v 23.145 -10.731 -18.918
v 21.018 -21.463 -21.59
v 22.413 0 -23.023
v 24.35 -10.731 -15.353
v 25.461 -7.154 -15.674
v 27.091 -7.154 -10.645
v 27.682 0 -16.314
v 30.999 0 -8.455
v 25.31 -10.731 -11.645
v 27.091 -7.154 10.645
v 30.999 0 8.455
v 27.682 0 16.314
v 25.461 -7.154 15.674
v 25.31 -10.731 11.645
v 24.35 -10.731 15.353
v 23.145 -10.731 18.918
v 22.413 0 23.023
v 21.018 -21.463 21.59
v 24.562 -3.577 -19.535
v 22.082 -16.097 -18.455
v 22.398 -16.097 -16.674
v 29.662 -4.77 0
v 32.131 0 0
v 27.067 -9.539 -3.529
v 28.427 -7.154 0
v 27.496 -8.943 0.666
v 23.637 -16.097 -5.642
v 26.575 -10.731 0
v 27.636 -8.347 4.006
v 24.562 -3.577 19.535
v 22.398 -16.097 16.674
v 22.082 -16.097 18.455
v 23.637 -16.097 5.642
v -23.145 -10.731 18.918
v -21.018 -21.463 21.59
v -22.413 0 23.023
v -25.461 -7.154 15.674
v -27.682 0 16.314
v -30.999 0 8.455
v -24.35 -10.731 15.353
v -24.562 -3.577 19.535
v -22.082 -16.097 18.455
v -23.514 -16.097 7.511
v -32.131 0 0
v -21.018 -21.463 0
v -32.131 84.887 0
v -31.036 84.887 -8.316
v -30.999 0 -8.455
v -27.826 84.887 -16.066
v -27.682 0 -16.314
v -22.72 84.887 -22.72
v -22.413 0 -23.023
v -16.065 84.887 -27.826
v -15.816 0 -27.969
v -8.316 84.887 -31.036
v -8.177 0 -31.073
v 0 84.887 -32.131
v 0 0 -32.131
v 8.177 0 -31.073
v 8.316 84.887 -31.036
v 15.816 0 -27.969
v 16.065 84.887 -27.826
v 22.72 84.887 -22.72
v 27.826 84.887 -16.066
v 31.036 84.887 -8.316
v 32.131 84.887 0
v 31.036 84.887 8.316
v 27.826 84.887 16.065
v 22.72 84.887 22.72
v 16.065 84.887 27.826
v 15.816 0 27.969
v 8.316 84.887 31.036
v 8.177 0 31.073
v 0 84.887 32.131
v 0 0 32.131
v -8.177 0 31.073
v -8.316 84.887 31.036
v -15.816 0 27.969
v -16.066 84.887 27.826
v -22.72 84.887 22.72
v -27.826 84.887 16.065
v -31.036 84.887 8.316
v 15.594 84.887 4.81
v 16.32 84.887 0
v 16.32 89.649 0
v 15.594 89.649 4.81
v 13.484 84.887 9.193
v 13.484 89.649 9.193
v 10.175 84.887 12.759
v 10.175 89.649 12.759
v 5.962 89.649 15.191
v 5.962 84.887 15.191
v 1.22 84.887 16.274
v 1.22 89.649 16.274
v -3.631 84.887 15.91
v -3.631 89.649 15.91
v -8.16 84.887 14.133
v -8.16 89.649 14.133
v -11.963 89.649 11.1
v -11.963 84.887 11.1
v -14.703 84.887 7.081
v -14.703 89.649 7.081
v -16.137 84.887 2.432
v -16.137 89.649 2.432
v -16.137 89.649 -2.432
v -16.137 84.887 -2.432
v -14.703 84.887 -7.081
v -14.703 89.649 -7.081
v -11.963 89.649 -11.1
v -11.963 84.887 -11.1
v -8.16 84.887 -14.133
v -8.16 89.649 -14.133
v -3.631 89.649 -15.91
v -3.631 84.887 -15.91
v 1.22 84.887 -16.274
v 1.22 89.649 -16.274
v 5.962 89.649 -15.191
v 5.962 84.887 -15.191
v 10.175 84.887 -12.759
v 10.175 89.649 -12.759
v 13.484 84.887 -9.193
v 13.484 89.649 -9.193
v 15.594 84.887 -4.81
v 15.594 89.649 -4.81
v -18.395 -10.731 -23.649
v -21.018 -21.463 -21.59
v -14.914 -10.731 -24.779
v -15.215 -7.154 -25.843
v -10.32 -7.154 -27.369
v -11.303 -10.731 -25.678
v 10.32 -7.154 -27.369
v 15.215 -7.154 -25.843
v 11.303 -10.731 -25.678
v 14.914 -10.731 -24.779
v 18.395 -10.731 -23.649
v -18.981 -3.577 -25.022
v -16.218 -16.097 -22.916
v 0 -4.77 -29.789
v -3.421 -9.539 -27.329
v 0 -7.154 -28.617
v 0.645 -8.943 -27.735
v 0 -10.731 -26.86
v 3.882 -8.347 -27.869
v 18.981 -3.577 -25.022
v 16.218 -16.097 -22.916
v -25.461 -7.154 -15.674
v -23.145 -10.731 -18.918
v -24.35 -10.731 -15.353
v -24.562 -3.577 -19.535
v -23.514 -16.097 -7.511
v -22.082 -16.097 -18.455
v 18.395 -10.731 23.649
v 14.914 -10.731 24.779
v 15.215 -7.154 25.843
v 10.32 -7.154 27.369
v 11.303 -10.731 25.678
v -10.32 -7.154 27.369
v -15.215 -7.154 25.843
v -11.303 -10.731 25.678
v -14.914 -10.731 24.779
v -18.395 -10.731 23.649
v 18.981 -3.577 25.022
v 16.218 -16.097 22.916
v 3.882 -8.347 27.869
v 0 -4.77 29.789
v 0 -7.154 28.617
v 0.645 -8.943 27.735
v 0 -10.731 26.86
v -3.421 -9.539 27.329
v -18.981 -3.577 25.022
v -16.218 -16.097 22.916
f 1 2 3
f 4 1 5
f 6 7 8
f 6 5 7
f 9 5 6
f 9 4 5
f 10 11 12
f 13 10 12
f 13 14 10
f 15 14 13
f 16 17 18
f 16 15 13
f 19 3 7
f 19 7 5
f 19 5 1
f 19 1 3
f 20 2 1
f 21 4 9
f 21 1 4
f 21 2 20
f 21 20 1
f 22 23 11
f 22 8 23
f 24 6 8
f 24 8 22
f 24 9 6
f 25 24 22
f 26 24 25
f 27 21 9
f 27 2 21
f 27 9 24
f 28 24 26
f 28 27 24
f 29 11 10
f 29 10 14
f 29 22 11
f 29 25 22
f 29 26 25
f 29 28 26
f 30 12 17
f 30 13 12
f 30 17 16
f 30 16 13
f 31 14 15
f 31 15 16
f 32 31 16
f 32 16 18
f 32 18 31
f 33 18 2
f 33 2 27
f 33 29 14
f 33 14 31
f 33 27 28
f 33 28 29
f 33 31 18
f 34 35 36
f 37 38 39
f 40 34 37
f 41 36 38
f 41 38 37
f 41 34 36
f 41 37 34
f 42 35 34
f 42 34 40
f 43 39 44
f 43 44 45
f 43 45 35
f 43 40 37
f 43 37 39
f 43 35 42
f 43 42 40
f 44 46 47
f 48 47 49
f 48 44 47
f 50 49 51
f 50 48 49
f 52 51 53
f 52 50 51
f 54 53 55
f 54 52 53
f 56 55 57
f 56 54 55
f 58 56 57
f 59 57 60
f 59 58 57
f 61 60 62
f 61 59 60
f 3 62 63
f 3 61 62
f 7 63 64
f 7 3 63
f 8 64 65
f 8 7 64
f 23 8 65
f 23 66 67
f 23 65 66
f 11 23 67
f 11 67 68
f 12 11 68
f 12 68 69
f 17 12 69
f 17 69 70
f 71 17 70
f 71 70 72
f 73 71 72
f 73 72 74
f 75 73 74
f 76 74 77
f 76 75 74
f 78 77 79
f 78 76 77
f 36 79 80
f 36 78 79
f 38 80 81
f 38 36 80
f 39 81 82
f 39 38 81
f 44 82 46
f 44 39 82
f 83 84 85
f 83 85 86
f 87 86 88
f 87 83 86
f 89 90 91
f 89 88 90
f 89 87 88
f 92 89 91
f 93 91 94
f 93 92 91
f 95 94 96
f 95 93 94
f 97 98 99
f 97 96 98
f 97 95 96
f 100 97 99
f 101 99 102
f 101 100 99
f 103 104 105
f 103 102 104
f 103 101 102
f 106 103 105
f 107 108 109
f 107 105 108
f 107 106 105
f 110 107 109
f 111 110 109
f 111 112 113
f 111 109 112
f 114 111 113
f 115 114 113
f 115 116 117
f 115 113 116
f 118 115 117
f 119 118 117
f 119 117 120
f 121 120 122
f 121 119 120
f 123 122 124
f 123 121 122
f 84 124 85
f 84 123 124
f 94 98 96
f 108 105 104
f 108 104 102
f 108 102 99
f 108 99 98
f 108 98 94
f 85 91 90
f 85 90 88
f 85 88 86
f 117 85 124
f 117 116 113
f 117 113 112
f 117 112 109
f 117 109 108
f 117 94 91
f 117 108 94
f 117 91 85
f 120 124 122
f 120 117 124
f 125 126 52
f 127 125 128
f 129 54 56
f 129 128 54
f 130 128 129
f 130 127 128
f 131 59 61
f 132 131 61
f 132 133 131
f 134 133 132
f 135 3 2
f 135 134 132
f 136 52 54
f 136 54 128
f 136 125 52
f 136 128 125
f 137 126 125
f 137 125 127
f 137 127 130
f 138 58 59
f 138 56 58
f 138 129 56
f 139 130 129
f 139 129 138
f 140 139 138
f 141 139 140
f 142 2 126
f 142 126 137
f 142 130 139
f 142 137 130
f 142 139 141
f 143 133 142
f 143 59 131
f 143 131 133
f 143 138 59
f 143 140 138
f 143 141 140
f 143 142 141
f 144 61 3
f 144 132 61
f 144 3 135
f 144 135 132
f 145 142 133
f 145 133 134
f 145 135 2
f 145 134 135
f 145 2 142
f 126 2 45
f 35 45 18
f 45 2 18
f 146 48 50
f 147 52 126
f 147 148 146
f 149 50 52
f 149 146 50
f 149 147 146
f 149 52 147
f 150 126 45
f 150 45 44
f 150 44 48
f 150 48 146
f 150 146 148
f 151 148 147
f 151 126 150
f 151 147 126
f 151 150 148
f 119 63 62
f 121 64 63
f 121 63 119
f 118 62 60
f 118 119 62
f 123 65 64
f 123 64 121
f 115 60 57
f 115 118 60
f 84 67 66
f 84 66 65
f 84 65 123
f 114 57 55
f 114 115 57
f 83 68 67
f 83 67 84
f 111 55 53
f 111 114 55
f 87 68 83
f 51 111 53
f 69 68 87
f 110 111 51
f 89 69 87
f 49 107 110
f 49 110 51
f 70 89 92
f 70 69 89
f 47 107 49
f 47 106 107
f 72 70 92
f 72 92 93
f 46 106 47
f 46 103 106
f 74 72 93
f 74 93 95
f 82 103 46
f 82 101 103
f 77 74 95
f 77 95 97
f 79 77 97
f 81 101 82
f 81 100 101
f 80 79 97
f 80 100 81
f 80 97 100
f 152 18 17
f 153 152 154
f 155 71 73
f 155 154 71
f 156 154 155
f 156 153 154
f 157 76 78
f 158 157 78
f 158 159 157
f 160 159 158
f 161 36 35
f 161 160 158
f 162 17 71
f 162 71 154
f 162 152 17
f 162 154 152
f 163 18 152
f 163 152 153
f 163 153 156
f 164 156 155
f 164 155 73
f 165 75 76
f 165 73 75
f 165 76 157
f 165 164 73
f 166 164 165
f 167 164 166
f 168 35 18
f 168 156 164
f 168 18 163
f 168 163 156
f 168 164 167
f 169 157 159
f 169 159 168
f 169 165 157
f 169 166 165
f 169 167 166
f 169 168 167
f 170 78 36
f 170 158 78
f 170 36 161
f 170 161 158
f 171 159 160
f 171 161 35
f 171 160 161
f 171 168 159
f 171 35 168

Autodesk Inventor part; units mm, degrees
ref_plane "YZ Plane" through (0, 0, 0) normal (1, 0, 0) x (0, 1, 0)
ref_plane "XZ Plane" through (0, 0, 0) normal (0, 1, 0) x (-1, 0, 0)
ref_plane "XY Plane" through (0, 0, 0) normal (0, 0, 1) x (1, 0, 0)
sketch "Sketch1" plane through (0, 0, 0) normal (0, 1, 0) x (-1, 0, 0)
  circle A0 centre (0, 0) radius 16.3195
  circle A1 centre (0, 0) radius 32.131
  dimension "d0" = 32.639
  dimension "d1" = 64.262
extrude "Extrusion1" add sketch "Sketch1" along normal blind 84.8868 contours A0 | A1
sketch "Sketch2" plane through (0, 84.8868, 0) normal (0, 1, 0) x (1, 0, 0)
  circle A0 centre (0, 0) radius 16.3195
  dimension "d4" = 32.639
extrude "Extrusion2" add sketch "Sketch2" along normal blind 4.7625
sketch "Sketch3" plane through (0, 0, 0) normal (0, -1, 0) x (1, 0, 0)
  circle A0 centre (0, 0) radius 32.131
ref_plane "Work Plane1" through (0, -21.463, 0) normal (0, -1, 0) x (1, 0, 0)
sketch "Sketch4" plane through (0, -21.463, 0) normal (0, -1, 0) x (1, 0, 0)
  line L0 (21.0185, 21.59) -> (-21.0185, 21.59)
  line L1 (-21.0185, 21.59) -> (-21.0185, -21.59)
  line L2 (-21.0185, -21.59) -> (21.0185, -21.59)
  line L3 (21.0185, -21.59) -> (21.0185, 21.59)
  point P0 (0, 0)
  dimension "d8" = 43.18
  dimension "d9" = 42.037
  dimension "d10" = 21.0185
  dimension "d11" = 21.59
loft "Loft1" add profiles "Sketch4" section 1 edges at (32.131, 0, 0)
equation "\"d10\" = 0.5 * d9"
equation "\"d11\" = 0.5 * d8"
properties part number "Motor"
